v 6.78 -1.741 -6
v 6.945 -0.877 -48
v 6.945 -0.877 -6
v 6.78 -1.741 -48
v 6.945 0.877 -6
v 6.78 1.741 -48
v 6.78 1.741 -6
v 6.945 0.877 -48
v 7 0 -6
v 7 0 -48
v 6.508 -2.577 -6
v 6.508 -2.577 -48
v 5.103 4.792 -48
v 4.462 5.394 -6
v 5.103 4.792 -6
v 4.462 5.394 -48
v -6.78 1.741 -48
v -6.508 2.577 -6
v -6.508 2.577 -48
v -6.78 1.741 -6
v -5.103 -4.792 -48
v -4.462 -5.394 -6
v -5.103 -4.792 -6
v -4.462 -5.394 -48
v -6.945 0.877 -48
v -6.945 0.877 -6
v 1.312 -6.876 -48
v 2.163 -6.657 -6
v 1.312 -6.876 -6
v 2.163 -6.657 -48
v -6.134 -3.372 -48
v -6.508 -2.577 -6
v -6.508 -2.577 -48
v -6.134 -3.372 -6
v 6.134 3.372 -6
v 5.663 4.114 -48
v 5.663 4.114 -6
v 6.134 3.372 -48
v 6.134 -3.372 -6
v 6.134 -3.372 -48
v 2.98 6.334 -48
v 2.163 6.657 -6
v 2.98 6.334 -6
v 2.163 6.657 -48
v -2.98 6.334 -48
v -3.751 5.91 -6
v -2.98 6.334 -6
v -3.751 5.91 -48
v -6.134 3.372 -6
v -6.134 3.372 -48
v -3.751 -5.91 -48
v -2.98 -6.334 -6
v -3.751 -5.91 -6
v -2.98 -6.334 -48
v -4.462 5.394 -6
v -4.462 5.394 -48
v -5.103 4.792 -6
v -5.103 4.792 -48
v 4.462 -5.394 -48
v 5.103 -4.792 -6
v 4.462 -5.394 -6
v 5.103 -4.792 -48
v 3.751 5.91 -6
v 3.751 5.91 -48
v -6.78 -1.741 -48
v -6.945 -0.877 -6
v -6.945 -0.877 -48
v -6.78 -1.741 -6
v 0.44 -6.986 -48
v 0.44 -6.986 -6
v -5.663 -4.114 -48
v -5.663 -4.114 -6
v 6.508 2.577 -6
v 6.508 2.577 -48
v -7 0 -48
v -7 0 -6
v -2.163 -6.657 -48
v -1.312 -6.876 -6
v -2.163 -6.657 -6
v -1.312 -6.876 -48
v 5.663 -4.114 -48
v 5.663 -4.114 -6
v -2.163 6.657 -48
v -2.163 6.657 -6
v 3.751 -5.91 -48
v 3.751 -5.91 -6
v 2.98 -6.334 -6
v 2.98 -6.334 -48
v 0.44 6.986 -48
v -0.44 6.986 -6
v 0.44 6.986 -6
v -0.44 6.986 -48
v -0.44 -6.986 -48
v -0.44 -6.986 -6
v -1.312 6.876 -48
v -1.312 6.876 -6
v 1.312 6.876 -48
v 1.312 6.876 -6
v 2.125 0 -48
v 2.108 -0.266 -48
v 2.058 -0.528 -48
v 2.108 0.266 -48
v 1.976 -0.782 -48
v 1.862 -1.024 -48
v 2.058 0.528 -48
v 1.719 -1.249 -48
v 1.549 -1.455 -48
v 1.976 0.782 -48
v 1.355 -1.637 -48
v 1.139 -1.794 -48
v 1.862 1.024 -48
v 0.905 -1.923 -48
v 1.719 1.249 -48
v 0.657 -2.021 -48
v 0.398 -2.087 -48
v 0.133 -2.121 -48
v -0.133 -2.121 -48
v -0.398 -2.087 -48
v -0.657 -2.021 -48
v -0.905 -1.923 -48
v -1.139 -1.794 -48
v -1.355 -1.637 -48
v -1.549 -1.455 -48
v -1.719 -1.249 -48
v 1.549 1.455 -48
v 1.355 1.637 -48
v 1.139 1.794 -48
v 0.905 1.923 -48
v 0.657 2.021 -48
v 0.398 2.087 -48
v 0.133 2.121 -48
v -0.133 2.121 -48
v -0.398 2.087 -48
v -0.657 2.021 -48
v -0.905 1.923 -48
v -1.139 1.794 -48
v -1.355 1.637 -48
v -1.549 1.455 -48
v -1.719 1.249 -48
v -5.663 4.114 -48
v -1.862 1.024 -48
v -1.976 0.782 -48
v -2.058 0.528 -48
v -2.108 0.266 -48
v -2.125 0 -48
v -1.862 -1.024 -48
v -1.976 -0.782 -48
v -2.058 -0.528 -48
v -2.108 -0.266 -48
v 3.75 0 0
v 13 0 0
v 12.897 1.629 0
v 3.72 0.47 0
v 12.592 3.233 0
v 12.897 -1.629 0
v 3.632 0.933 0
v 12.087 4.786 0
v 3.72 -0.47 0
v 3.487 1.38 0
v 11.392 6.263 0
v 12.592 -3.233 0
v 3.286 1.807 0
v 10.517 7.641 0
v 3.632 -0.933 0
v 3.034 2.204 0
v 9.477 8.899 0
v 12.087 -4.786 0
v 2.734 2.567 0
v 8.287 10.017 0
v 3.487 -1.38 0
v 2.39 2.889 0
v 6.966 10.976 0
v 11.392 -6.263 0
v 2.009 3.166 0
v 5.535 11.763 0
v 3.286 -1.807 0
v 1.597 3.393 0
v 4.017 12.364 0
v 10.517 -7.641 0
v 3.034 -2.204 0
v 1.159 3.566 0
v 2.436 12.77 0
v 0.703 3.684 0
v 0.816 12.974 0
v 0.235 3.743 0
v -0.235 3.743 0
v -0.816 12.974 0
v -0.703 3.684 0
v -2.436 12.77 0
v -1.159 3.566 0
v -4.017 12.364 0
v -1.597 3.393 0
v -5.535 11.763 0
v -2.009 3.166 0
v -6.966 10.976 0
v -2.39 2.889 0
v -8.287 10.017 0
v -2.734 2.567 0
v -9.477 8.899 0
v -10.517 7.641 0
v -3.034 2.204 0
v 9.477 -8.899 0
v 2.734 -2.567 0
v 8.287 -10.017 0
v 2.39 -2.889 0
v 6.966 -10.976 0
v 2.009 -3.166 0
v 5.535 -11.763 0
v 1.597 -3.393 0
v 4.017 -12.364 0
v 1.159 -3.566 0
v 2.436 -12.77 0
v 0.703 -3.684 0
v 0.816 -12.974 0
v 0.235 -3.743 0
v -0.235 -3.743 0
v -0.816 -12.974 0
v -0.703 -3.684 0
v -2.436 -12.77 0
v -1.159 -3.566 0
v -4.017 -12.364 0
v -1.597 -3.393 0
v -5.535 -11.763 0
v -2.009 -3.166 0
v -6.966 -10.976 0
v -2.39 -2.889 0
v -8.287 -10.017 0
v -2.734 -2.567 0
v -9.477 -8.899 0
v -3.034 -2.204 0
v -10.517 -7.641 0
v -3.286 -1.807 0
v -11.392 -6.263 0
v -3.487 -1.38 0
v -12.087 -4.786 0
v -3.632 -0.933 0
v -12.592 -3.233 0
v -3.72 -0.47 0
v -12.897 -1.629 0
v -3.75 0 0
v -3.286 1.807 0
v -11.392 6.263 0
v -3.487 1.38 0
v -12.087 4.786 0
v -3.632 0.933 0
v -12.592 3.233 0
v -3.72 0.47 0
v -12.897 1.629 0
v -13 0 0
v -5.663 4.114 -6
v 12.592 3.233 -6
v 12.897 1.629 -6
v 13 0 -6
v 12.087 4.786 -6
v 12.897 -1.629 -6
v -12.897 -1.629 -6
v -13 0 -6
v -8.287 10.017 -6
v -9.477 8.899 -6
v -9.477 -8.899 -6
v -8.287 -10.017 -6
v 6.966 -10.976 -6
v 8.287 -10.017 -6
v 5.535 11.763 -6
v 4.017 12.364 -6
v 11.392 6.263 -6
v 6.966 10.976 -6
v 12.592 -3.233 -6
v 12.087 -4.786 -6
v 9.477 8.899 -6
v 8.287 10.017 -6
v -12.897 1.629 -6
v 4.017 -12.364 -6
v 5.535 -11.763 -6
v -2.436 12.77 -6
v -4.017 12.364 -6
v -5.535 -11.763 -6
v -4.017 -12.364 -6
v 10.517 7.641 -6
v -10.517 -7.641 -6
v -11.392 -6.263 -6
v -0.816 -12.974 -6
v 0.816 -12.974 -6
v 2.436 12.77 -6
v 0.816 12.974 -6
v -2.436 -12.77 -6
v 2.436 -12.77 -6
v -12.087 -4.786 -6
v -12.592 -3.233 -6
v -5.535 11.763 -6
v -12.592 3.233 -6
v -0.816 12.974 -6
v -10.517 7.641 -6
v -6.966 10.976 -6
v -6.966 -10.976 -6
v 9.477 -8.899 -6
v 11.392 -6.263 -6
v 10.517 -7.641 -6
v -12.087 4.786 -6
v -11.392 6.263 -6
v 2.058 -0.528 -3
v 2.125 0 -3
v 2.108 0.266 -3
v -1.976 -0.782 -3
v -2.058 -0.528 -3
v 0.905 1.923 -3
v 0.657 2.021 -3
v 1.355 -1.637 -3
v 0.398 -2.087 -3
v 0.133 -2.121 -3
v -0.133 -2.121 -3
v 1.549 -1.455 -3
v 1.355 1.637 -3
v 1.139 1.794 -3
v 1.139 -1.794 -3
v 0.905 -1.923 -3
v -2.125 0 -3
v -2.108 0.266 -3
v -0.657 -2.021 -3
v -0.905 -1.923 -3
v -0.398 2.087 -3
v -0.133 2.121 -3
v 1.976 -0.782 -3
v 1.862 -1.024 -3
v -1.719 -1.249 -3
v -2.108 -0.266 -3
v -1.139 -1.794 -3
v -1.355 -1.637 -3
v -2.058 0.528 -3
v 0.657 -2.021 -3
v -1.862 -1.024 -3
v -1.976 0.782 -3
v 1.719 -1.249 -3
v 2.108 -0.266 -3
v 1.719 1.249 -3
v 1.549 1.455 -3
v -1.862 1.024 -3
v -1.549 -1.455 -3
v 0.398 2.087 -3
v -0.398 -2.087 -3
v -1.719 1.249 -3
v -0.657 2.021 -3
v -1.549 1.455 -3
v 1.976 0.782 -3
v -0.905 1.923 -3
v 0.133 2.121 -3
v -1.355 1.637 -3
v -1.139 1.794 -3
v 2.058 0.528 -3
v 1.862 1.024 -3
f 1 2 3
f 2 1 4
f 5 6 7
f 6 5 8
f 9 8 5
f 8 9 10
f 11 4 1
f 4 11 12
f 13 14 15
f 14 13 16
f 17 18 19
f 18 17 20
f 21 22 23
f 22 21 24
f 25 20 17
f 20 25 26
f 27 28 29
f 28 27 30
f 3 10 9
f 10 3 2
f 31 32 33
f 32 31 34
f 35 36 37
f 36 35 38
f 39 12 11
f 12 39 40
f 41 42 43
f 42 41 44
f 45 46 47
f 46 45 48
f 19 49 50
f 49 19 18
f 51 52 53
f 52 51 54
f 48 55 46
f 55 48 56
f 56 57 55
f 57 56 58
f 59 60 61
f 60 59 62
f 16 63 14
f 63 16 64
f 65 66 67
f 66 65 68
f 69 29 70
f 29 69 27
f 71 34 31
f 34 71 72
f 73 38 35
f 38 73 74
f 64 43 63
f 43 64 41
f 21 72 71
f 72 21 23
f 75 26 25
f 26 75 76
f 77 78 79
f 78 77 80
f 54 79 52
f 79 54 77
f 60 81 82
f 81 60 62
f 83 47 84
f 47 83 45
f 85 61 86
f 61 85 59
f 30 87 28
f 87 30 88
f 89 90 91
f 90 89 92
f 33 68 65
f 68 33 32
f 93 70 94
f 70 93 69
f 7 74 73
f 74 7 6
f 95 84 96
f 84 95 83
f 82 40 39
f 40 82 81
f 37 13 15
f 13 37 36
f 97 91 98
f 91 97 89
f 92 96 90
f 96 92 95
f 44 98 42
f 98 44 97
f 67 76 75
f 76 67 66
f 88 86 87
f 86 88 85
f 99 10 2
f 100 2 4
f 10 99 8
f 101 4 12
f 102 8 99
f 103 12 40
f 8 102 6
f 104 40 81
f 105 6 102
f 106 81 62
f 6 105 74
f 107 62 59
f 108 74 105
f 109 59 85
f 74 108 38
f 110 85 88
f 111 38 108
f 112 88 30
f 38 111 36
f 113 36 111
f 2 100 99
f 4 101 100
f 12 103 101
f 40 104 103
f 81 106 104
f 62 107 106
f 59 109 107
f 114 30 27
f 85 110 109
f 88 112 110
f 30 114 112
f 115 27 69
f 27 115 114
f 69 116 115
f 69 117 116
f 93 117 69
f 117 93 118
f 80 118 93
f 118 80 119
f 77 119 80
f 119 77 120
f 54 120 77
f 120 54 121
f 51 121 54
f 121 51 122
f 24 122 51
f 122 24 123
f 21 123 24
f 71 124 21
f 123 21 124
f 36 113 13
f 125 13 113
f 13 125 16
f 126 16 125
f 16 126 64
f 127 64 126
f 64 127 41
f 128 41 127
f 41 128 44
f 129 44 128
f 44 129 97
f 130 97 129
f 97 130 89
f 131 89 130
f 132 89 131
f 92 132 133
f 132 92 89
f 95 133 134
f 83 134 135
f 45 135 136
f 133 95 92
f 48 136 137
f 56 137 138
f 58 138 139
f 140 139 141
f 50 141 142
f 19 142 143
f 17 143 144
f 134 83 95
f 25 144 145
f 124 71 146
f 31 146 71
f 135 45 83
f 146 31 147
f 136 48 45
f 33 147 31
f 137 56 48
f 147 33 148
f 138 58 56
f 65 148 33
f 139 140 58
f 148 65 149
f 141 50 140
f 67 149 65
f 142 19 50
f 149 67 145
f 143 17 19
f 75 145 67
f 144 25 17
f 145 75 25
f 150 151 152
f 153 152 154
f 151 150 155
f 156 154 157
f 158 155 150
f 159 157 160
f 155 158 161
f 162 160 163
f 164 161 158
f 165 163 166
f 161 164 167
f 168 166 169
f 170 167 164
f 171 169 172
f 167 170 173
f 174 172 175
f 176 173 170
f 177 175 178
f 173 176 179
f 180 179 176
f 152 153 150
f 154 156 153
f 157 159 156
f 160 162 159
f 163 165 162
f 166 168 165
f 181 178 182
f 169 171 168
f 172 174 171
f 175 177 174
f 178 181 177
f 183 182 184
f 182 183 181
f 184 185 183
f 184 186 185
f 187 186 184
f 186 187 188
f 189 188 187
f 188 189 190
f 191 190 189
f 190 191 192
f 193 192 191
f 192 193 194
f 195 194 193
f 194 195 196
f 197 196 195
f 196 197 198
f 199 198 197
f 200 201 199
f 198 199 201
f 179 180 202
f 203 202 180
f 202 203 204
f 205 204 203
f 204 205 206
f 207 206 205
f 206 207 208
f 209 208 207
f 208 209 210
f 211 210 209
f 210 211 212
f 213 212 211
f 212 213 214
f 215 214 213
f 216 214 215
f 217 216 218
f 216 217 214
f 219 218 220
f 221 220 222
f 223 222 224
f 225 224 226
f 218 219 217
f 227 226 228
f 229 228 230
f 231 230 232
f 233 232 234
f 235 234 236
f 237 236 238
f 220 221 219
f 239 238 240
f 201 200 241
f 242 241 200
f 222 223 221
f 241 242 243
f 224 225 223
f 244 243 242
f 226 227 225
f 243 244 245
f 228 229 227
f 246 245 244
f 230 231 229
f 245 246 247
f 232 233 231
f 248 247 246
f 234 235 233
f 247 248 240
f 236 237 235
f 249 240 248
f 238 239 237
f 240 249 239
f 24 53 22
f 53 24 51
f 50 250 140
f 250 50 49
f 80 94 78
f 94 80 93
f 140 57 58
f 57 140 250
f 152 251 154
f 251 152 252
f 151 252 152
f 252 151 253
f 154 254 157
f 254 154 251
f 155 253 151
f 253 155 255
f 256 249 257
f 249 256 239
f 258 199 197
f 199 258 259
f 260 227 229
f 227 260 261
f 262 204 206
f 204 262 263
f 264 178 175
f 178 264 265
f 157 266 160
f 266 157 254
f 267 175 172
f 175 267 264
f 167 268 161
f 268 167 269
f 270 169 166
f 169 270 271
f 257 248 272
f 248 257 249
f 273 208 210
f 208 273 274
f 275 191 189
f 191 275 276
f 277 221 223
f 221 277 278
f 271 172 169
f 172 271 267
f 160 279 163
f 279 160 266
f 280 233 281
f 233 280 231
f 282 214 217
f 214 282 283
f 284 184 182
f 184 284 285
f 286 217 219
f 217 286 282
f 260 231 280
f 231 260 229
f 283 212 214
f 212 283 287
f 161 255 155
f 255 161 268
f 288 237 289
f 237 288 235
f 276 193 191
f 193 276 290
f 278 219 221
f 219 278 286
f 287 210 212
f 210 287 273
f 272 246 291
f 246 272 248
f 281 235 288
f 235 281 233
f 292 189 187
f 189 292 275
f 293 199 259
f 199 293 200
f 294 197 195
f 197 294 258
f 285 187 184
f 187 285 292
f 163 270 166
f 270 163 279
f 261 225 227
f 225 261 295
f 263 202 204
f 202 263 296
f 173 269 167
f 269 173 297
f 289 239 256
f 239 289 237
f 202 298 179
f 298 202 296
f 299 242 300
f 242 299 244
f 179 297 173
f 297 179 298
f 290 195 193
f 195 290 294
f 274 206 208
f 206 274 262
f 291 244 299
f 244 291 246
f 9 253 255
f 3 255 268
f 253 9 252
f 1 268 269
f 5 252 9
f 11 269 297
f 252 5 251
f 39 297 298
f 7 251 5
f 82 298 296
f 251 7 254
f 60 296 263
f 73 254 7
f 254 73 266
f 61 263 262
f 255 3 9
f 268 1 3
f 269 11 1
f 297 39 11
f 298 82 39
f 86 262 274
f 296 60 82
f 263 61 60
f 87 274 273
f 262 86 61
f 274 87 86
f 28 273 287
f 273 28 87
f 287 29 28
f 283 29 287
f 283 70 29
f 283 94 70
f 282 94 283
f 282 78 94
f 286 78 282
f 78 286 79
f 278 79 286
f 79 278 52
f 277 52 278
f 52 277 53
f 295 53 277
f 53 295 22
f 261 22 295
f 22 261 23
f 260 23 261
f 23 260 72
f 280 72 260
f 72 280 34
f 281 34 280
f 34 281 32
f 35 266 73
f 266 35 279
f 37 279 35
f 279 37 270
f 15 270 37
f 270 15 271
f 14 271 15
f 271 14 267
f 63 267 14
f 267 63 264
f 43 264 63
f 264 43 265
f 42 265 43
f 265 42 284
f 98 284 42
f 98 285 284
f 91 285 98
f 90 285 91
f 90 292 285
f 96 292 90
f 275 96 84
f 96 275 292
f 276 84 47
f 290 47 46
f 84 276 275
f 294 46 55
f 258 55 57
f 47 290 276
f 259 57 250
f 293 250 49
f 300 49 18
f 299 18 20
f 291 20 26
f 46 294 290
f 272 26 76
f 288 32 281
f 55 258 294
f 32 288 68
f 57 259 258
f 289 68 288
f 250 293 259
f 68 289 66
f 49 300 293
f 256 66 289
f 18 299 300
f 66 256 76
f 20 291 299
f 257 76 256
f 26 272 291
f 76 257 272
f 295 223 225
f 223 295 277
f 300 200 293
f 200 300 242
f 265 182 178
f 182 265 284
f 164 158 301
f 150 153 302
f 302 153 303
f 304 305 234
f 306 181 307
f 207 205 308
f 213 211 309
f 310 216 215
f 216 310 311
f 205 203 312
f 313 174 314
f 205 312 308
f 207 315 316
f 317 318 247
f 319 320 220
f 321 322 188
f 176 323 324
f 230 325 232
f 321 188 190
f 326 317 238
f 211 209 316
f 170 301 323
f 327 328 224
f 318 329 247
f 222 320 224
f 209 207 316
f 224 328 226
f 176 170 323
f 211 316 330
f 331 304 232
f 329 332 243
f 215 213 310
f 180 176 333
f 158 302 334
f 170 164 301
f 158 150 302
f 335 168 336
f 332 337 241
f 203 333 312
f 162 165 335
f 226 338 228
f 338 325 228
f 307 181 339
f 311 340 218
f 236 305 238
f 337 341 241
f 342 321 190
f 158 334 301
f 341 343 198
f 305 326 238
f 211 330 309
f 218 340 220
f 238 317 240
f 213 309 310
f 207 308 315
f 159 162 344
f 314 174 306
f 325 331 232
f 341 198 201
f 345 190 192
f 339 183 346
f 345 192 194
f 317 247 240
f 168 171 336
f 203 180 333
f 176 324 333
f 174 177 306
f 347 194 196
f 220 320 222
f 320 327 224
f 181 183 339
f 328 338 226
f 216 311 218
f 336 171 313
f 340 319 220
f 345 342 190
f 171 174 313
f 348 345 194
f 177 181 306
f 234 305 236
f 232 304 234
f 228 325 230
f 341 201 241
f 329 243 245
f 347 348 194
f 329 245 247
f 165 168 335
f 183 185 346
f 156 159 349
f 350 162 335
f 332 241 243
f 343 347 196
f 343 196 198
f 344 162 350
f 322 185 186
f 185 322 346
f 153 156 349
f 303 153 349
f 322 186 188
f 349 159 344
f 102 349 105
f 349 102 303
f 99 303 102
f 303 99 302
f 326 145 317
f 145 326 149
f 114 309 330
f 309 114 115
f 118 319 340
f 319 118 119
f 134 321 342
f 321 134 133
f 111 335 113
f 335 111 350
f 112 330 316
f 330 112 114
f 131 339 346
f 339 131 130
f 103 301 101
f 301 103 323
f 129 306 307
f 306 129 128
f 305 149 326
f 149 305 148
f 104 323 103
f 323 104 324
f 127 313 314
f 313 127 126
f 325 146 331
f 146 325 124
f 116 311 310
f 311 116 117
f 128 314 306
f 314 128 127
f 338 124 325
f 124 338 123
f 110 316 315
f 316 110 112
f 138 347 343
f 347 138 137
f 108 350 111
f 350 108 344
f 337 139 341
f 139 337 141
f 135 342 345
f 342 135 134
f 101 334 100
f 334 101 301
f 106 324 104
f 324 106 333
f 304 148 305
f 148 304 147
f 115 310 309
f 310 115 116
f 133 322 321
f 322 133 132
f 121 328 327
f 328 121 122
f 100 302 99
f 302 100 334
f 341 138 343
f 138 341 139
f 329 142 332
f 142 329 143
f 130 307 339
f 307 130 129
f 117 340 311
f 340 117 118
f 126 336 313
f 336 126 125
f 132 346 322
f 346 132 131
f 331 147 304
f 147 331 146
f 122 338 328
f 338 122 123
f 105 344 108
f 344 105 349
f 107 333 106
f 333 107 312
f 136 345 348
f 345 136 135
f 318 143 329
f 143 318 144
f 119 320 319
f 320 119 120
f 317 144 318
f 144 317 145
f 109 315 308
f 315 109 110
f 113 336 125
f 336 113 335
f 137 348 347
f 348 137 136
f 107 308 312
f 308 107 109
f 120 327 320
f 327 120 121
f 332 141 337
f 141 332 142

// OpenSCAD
$fn = 50;


difference() {
	union() {
		translate(v = [0, 0, -48.0000000000]) {
			cylinder(h = 48, r = 7.0000000000);
		}
		translate(v = [0, 0, -6.0000000000]) {
			cylinder(h = 6, r = 13.0000000000);
		}
	}
	union() {
		translate(v = [0, 0, 0]) {
			rotate(a = [0, 0, 0]) {
				difference() {
					union() {
						#translate(v = [0, 0, -48.0000000000]) {
							cylinder(h = 48, r = 2.0000000000);
						}
						#translate(v = [0, 0, -3]) {
							cylinder(h = 3, r1 = 2.1250000000, r2 = 3.7500000000);
						}
						#translate(v = [0, 0, -48.0000000000]) {
							cylinder(h = 48, r = 2.1250000000);
						}
						#translate(v = [0, 0, -48.0000000000]) {
							cylinder(h = 48, r = 2.0000000000);
						}
					}
					union();
				}
			}
		}
	}
}
